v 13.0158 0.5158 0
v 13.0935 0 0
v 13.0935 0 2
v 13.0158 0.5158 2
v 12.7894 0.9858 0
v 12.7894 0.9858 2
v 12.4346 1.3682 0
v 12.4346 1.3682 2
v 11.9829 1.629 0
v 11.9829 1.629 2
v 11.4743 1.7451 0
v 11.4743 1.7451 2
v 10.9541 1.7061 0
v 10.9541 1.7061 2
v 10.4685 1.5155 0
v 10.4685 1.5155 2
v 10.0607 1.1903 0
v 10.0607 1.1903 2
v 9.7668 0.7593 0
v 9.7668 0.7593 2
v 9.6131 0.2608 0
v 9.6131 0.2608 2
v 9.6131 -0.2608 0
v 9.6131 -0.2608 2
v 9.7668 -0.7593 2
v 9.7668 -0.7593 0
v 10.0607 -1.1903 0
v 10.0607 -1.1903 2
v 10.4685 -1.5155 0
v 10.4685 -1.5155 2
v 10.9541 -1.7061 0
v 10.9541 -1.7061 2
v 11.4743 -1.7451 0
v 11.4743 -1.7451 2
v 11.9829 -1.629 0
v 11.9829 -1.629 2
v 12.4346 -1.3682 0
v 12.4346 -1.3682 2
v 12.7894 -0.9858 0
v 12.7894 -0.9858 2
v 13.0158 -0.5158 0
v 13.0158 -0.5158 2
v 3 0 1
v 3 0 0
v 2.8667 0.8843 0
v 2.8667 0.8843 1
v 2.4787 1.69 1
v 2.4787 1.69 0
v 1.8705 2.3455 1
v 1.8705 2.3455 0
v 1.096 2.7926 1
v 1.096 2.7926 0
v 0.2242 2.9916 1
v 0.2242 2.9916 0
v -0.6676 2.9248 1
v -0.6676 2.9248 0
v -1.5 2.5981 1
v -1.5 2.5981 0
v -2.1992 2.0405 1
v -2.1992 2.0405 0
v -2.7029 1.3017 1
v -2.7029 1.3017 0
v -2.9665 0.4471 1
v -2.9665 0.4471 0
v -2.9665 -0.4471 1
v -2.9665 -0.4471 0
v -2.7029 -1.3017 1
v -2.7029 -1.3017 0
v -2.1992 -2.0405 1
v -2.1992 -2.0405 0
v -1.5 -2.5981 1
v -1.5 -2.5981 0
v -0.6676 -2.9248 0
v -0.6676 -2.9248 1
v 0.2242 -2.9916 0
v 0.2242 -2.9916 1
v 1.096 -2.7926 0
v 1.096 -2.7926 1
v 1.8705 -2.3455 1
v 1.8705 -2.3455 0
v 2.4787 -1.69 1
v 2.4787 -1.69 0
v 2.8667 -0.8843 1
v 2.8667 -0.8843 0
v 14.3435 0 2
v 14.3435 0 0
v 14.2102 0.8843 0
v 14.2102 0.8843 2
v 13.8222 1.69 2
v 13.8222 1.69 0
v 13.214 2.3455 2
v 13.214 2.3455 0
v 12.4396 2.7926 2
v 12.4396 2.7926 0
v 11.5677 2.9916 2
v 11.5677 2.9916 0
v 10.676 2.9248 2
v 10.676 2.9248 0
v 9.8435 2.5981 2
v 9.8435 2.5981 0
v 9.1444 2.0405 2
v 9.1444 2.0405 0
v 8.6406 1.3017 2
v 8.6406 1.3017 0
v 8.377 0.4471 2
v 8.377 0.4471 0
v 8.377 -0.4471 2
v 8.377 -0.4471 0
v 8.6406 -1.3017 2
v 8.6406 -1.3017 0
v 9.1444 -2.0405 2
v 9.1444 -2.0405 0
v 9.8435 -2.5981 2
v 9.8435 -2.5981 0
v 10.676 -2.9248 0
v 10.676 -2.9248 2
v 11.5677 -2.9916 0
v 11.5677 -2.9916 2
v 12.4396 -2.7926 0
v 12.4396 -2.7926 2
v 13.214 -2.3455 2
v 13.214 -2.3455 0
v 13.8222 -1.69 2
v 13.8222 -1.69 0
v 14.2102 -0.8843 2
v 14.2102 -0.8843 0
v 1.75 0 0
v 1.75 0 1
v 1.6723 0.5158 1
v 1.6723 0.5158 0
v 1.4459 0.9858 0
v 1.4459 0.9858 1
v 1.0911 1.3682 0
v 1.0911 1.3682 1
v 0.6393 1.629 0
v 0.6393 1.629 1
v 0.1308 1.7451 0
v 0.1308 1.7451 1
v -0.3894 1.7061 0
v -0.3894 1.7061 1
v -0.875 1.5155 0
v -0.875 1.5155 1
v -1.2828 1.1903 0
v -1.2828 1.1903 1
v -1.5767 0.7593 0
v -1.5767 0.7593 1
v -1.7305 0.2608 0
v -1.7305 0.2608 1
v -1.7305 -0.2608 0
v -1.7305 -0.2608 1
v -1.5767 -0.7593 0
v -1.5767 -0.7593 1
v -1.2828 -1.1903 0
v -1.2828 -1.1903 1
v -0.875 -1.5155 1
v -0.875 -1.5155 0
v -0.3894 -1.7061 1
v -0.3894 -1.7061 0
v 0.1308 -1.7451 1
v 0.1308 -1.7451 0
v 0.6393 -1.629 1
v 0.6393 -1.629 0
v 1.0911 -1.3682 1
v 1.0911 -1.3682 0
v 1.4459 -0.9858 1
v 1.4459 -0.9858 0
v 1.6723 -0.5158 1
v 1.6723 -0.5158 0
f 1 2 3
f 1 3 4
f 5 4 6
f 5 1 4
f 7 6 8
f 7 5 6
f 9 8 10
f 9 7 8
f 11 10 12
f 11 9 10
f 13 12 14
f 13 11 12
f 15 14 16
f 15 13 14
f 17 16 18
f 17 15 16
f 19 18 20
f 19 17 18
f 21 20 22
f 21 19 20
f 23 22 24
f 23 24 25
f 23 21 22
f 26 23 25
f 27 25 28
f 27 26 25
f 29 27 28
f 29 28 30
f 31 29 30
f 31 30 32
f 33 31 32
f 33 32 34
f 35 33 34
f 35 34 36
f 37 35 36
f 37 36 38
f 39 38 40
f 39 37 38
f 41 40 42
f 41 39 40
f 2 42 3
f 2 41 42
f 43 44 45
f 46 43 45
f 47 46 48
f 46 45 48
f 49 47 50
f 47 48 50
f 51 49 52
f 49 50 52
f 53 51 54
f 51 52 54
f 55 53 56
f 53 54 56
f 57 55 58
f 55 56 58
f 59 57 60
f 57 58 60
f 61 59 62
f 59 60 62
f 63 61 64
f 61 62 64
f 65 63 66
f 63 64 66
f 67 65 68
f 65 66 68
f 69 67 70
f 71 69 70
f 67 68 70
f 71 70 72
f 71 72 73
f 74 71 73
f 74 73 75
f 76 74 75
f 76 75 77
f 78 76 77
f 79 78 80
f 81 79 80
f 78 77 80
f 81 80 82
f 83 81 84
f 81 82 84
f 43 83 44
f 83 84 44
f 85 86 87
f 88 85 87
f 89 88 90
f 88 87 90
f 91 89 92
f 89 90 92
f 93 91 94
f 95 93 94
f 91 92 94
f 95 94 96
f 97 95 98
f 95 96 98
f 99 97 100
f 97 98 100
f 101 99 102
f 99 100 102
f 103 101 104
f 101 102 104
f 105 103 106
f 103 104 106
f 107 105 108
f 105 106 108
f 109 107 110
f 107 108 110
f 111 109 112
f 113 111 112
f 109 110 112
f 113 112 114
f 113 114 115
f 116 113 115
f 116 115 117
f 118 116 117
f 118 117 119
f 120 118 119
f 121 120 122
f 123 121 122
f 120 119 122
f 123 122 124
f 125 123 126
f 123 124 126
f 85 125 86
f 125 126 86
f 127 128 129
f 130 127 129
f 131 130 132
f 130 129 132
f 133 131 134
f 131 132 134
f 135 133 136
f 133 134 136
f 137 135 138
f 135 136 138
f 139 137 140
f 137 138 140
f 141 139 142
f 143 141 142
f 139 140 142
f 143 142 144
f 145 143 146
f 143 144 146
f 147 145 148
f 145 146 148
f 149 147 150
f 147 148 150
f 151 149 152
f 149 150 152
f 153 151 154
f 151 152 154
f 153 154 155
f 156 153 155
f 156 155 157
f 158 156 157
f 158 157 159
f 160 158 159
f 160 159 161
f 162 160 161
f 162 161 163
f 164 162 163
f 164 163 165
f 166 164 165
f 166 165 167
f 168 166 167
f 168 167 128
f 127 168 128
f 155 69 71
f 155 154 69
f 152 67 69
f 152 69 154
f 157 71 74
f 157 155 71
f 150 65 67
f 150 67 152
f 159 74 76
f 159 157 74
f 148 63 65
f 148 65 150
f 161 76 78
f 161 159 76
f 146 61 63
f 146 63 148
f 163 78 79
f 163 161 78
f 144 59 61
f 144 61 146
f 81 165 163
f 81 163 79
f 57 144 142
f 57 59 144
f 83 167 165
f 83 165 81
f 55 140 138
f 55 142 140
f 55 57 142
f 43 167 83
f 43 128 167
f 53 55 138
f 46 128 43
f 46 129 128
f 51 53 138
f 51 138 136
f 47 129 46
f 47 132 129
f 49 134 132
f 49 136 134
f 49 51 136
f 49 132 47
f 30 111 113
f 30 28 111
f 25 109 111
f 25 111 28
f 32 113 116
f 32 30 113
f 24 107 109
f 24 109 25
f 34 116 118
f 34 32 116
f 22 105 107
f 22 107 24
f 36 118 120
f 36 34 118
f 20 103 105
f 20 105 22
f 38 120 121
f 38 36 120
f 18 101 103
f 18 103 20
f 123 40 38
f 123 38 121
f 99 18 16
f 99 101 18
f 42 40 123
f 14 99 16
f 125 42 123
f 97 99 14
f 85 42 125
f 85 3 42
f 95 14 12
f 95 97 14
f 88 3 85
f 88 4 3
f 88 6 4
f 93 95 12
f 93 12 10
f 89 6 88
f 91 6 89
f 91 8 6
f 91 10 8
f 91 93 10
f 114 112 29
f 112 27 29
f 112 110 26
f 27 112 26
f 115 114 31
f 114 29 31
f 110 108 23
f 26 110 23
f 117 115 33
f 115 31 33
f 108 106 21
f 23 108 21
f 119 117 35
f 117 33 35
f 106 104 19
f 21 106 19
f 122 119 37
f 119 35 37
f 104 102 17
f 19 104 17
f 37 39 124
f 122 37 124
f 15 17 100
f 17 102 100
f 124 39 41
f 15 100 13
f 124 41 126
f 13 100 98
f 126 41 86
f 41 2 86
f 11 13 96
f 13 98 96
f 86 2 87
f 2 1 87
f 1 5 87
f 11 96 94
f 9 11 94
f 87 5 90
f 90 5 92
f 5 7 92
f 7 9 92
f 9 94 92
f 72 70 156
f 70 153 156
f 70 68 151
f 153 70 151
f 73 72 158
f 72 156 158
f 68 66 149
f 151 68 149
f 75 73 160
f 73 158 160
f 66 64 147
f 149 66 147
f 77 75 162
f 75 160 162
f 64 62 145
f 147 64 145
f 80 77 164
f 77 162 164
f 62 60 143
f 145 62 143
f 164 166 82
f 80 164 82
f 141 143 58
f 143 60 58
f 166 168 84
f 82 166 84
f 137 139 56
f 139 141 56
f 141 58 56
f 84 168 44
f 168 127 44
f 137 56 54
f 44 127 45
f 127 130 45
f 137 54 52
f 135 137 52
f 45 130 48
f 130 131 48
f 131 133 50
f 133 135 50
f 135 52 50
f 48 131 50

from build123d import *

# Parameters (mm, degrees)
F0_R     = 3
F1_DEPTH = 1
F2_R     = 1.75
F3_DEPTH = 25
F4_R     = 3
F4_R_2   = 1.75
F5_DEPTH = 2


with BuildPart() as f1:
    # F0 (on Top) → F1 (new body)
    with BuildSketch(Plane.XY):
        Circle(F0_R)
    extrude(amount=F1_DEPTH)

    # F2 (on face) → F3 (cut)
    with BuildSketch(Plane.XY.offset(1)):
        Circle(F2_R)
    extrude(amount=-F3_DEPTH, mode=Mode.SUBTRACT)


with BuildPart() as f5:
    # F4 (on Top) → F5 (new body)
    with BuildSketch(Plane.XY):
        with Locations((11.34353, 0)):
            Circle(F4_R)
        with Locations((11.34353, 0)):
            Circle(F4_R_2, mode=Mode.SUBTRACT)
    extrude(amount=F5_DEPTH)


solid = Compound([f1.part, f5.part])
